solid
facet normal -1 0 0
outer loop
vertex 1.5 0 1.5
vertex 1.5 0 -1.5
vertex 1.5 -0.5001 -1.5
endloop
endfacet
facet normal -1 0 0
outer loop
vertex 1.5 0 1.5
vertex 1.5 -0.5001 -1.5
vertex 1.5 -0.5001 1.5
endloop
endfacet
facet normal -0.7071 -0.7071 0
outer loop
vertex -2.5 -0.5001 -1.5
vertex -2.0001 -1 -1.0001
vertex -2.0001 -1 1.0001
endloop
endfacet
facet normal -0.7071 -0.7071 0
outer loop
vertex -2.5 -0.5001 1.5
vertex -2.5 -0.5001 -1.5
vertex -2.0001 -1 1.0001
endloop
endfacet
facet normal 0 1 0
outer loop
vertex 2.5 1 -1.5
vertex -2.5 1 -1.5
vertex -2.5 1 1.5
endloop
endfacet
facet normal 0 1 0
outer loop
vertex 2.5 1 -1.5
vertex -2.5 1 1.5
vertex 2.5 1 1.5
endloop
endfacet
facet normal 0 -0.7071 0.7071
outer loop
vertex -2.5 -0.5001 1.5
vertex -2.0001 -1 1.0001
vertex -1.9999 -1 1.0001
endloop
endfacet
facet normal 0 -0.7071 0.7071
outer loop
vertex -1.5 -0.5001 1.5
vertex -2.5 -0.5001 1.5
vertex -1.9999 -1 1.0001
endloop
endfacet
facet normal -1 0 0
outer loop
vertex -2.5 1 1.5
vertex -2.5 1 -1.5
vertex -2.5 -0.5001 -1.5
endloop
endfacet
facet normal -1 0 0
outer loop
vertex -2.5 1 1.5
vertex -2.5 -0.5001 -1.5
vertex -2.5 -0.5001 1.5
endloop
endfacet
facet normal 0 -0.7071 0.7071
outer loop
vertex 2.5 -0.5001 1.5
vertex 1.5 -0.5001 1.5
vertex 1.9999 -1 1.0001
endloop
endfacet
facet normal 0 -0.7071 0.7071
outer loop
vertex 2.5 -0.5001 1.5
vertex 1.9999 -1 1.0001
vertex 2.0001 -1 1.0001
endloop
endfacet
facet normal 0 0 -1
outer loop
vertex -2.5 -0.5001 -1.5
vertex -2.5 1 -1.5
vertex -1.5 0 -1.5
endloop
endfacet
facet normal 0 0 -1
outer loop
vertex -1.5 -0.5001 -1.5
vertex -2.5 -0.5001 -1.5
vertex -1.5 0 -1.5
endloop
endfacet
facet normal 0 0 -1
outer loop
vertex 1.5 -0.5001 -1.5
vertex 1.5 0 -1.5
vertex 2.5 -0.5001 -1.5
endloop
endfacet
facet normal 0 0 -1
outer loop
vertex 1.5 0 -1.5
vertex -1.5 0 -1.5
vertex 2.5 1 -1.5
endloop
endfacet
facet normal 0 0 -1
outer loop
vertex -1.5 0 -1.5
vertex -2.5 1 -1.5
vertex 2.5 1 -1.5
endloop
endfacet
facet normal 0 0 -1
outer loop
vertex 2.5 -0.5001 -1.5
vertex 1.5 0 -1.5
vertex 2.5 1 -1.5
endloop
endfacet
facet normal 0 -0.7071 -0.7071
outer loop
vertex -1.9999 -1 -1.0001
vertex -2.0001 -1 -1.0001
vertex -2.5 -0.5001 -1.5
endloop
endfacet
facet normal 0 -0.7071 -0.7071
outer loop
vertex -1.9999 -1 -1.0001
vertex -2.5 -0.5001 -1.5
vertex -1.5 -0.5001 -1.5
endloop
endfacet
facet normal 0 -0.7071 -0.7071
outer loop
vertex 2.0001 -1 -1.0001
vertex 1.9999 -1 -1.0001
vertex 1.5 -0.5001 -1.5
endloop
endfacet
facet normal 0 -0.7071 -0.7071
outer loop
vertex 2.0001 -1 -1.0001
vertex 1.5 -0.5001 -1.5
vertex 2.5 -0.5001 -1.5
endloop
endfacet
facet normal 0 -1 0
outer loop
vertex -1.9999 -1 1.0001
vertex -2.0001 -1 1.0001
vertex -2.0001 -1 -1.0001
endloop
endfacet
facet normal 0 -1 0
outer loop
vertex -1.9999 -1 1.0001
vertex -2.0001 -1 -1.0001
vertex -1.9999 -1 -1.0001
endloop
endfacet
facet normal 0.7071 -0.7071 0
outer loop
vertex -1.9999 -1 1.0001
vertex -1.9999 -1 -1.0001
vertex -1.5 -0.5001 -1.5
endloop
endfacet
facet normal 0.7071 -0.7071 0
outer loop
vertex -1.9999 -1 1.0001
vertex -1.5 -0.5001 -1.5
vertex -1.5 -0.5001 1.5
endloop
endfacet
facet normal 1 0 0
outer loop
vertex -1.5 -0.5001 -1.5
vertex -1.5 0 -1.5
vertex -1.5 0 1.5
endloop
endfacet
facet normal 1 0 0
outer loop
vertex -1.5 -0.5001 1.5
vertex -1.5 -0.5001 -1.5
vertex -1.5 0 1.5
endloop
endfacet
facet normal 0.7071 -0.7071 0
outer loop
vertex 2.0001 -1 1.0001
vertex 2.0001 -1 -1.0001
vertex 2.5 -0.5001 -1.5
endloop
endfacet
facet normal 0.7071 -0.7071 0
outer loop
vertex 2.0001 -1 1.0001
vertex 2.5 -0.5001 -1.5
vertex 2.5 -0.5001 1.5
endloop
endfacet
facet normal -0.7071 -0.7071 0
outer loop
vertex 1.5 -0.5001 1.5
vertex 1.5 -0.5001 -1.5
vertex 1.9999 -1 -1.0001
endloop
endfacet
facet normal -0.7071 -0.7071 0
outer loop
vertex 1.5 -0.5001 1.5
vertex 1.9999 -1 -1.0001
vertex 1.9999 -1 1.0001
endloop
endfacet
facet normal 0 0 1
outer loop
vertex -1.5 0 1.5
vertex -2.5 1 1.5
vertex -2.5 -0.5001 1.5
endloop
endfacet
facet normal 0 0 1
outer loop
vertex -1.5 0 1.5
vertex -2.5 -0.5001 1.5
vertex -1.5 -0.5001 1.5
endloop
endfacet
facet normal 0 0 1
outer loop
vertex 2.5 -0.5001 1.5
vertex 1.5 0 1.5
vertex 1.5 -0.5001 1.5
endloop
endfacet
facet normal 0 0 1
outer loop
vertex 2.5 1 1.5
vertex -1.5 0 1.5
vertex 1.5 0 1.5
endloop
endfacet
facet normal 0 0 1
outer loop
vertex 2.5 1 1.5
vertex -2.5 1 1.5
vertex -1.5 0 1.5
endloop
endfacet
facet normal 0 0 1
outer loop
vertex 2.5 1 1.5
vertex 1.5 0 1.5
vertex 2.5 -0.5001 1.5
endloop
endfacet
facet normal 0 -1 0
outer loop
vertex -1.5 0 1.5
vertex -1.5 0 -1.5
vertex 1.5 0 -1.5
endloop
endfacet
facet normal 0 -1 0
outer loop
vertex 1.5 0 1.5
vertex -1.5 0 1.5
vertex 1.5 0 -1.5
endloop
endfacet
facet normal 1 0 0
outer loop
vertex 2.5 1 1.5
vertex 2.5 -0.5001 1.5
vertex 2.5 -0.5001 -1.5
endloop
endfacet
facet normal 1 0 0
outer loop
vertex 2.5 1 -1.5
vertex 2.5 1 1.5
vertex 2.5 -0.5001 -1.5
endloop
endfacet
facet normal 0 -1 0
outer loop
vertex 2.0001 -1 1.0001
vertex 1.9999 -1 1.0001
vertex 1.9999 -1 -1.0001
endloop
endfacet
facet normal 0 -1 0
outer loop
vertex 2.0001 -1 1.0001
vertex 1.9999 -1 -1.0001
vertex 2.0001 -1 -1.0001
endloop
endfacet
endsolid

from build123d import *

# Parameters (mm, degrees)
SKETCH1_W           = 5
SKETCH1_H           = 3
BOSS_EXTRUDE1_DEPTH = 1
SKETCH2_W           = 1
SKETCH2_H           = 3
BOSS_EXTRUDE2_DEPTH = 1
CHAMFER1_SIZE       = 0.5


with BuildPart() as part:
    # Sketch1 → Boss-Extrude1 (new body)
    with BuildSketch(Plane(origin=(0, 0, 0), x_dir=(1, 0, 0), z_dir=(0, 1, 0))):
        Rectangle(SKETCH1_W, SKETCH1_H)
    extrude(amount=BOSS_EXTRUDE1_DEPTH)

    # Sketch2 → Boss-Extrude2 (add)
    with BuildSketch(Plane.XZ):
        with Locations((-2, 0)):
            Rectangle(SKETCH2_W, SKETCH2_H)
        with Locations((2, 0)):
            Rectangle(SKETCH2_W, SKETCH2_H)
    extrude(amount=BOSS_EXTRUDE2_DEPTH)

    # Chamfer1
    chamfer1_edges = [part.edges().sort_by_distance(p)[0] for p in [
        (-2.5, -1, 0),
        (-2, -1, -1.5),
        (-1.5, -1, 0),
        (-2, -1, 1.5),
        (2.5, -1, 0),
        (2, -1, 1.5),
        (1.5, -1, 0),
        (2, -1, -1.5),
    ]]
    chamfer(chamfer1_edges, length=CHAMFER1_SIZE - 0.0001)  # a hair under: the kernel refuses the full size


solid = part.part
